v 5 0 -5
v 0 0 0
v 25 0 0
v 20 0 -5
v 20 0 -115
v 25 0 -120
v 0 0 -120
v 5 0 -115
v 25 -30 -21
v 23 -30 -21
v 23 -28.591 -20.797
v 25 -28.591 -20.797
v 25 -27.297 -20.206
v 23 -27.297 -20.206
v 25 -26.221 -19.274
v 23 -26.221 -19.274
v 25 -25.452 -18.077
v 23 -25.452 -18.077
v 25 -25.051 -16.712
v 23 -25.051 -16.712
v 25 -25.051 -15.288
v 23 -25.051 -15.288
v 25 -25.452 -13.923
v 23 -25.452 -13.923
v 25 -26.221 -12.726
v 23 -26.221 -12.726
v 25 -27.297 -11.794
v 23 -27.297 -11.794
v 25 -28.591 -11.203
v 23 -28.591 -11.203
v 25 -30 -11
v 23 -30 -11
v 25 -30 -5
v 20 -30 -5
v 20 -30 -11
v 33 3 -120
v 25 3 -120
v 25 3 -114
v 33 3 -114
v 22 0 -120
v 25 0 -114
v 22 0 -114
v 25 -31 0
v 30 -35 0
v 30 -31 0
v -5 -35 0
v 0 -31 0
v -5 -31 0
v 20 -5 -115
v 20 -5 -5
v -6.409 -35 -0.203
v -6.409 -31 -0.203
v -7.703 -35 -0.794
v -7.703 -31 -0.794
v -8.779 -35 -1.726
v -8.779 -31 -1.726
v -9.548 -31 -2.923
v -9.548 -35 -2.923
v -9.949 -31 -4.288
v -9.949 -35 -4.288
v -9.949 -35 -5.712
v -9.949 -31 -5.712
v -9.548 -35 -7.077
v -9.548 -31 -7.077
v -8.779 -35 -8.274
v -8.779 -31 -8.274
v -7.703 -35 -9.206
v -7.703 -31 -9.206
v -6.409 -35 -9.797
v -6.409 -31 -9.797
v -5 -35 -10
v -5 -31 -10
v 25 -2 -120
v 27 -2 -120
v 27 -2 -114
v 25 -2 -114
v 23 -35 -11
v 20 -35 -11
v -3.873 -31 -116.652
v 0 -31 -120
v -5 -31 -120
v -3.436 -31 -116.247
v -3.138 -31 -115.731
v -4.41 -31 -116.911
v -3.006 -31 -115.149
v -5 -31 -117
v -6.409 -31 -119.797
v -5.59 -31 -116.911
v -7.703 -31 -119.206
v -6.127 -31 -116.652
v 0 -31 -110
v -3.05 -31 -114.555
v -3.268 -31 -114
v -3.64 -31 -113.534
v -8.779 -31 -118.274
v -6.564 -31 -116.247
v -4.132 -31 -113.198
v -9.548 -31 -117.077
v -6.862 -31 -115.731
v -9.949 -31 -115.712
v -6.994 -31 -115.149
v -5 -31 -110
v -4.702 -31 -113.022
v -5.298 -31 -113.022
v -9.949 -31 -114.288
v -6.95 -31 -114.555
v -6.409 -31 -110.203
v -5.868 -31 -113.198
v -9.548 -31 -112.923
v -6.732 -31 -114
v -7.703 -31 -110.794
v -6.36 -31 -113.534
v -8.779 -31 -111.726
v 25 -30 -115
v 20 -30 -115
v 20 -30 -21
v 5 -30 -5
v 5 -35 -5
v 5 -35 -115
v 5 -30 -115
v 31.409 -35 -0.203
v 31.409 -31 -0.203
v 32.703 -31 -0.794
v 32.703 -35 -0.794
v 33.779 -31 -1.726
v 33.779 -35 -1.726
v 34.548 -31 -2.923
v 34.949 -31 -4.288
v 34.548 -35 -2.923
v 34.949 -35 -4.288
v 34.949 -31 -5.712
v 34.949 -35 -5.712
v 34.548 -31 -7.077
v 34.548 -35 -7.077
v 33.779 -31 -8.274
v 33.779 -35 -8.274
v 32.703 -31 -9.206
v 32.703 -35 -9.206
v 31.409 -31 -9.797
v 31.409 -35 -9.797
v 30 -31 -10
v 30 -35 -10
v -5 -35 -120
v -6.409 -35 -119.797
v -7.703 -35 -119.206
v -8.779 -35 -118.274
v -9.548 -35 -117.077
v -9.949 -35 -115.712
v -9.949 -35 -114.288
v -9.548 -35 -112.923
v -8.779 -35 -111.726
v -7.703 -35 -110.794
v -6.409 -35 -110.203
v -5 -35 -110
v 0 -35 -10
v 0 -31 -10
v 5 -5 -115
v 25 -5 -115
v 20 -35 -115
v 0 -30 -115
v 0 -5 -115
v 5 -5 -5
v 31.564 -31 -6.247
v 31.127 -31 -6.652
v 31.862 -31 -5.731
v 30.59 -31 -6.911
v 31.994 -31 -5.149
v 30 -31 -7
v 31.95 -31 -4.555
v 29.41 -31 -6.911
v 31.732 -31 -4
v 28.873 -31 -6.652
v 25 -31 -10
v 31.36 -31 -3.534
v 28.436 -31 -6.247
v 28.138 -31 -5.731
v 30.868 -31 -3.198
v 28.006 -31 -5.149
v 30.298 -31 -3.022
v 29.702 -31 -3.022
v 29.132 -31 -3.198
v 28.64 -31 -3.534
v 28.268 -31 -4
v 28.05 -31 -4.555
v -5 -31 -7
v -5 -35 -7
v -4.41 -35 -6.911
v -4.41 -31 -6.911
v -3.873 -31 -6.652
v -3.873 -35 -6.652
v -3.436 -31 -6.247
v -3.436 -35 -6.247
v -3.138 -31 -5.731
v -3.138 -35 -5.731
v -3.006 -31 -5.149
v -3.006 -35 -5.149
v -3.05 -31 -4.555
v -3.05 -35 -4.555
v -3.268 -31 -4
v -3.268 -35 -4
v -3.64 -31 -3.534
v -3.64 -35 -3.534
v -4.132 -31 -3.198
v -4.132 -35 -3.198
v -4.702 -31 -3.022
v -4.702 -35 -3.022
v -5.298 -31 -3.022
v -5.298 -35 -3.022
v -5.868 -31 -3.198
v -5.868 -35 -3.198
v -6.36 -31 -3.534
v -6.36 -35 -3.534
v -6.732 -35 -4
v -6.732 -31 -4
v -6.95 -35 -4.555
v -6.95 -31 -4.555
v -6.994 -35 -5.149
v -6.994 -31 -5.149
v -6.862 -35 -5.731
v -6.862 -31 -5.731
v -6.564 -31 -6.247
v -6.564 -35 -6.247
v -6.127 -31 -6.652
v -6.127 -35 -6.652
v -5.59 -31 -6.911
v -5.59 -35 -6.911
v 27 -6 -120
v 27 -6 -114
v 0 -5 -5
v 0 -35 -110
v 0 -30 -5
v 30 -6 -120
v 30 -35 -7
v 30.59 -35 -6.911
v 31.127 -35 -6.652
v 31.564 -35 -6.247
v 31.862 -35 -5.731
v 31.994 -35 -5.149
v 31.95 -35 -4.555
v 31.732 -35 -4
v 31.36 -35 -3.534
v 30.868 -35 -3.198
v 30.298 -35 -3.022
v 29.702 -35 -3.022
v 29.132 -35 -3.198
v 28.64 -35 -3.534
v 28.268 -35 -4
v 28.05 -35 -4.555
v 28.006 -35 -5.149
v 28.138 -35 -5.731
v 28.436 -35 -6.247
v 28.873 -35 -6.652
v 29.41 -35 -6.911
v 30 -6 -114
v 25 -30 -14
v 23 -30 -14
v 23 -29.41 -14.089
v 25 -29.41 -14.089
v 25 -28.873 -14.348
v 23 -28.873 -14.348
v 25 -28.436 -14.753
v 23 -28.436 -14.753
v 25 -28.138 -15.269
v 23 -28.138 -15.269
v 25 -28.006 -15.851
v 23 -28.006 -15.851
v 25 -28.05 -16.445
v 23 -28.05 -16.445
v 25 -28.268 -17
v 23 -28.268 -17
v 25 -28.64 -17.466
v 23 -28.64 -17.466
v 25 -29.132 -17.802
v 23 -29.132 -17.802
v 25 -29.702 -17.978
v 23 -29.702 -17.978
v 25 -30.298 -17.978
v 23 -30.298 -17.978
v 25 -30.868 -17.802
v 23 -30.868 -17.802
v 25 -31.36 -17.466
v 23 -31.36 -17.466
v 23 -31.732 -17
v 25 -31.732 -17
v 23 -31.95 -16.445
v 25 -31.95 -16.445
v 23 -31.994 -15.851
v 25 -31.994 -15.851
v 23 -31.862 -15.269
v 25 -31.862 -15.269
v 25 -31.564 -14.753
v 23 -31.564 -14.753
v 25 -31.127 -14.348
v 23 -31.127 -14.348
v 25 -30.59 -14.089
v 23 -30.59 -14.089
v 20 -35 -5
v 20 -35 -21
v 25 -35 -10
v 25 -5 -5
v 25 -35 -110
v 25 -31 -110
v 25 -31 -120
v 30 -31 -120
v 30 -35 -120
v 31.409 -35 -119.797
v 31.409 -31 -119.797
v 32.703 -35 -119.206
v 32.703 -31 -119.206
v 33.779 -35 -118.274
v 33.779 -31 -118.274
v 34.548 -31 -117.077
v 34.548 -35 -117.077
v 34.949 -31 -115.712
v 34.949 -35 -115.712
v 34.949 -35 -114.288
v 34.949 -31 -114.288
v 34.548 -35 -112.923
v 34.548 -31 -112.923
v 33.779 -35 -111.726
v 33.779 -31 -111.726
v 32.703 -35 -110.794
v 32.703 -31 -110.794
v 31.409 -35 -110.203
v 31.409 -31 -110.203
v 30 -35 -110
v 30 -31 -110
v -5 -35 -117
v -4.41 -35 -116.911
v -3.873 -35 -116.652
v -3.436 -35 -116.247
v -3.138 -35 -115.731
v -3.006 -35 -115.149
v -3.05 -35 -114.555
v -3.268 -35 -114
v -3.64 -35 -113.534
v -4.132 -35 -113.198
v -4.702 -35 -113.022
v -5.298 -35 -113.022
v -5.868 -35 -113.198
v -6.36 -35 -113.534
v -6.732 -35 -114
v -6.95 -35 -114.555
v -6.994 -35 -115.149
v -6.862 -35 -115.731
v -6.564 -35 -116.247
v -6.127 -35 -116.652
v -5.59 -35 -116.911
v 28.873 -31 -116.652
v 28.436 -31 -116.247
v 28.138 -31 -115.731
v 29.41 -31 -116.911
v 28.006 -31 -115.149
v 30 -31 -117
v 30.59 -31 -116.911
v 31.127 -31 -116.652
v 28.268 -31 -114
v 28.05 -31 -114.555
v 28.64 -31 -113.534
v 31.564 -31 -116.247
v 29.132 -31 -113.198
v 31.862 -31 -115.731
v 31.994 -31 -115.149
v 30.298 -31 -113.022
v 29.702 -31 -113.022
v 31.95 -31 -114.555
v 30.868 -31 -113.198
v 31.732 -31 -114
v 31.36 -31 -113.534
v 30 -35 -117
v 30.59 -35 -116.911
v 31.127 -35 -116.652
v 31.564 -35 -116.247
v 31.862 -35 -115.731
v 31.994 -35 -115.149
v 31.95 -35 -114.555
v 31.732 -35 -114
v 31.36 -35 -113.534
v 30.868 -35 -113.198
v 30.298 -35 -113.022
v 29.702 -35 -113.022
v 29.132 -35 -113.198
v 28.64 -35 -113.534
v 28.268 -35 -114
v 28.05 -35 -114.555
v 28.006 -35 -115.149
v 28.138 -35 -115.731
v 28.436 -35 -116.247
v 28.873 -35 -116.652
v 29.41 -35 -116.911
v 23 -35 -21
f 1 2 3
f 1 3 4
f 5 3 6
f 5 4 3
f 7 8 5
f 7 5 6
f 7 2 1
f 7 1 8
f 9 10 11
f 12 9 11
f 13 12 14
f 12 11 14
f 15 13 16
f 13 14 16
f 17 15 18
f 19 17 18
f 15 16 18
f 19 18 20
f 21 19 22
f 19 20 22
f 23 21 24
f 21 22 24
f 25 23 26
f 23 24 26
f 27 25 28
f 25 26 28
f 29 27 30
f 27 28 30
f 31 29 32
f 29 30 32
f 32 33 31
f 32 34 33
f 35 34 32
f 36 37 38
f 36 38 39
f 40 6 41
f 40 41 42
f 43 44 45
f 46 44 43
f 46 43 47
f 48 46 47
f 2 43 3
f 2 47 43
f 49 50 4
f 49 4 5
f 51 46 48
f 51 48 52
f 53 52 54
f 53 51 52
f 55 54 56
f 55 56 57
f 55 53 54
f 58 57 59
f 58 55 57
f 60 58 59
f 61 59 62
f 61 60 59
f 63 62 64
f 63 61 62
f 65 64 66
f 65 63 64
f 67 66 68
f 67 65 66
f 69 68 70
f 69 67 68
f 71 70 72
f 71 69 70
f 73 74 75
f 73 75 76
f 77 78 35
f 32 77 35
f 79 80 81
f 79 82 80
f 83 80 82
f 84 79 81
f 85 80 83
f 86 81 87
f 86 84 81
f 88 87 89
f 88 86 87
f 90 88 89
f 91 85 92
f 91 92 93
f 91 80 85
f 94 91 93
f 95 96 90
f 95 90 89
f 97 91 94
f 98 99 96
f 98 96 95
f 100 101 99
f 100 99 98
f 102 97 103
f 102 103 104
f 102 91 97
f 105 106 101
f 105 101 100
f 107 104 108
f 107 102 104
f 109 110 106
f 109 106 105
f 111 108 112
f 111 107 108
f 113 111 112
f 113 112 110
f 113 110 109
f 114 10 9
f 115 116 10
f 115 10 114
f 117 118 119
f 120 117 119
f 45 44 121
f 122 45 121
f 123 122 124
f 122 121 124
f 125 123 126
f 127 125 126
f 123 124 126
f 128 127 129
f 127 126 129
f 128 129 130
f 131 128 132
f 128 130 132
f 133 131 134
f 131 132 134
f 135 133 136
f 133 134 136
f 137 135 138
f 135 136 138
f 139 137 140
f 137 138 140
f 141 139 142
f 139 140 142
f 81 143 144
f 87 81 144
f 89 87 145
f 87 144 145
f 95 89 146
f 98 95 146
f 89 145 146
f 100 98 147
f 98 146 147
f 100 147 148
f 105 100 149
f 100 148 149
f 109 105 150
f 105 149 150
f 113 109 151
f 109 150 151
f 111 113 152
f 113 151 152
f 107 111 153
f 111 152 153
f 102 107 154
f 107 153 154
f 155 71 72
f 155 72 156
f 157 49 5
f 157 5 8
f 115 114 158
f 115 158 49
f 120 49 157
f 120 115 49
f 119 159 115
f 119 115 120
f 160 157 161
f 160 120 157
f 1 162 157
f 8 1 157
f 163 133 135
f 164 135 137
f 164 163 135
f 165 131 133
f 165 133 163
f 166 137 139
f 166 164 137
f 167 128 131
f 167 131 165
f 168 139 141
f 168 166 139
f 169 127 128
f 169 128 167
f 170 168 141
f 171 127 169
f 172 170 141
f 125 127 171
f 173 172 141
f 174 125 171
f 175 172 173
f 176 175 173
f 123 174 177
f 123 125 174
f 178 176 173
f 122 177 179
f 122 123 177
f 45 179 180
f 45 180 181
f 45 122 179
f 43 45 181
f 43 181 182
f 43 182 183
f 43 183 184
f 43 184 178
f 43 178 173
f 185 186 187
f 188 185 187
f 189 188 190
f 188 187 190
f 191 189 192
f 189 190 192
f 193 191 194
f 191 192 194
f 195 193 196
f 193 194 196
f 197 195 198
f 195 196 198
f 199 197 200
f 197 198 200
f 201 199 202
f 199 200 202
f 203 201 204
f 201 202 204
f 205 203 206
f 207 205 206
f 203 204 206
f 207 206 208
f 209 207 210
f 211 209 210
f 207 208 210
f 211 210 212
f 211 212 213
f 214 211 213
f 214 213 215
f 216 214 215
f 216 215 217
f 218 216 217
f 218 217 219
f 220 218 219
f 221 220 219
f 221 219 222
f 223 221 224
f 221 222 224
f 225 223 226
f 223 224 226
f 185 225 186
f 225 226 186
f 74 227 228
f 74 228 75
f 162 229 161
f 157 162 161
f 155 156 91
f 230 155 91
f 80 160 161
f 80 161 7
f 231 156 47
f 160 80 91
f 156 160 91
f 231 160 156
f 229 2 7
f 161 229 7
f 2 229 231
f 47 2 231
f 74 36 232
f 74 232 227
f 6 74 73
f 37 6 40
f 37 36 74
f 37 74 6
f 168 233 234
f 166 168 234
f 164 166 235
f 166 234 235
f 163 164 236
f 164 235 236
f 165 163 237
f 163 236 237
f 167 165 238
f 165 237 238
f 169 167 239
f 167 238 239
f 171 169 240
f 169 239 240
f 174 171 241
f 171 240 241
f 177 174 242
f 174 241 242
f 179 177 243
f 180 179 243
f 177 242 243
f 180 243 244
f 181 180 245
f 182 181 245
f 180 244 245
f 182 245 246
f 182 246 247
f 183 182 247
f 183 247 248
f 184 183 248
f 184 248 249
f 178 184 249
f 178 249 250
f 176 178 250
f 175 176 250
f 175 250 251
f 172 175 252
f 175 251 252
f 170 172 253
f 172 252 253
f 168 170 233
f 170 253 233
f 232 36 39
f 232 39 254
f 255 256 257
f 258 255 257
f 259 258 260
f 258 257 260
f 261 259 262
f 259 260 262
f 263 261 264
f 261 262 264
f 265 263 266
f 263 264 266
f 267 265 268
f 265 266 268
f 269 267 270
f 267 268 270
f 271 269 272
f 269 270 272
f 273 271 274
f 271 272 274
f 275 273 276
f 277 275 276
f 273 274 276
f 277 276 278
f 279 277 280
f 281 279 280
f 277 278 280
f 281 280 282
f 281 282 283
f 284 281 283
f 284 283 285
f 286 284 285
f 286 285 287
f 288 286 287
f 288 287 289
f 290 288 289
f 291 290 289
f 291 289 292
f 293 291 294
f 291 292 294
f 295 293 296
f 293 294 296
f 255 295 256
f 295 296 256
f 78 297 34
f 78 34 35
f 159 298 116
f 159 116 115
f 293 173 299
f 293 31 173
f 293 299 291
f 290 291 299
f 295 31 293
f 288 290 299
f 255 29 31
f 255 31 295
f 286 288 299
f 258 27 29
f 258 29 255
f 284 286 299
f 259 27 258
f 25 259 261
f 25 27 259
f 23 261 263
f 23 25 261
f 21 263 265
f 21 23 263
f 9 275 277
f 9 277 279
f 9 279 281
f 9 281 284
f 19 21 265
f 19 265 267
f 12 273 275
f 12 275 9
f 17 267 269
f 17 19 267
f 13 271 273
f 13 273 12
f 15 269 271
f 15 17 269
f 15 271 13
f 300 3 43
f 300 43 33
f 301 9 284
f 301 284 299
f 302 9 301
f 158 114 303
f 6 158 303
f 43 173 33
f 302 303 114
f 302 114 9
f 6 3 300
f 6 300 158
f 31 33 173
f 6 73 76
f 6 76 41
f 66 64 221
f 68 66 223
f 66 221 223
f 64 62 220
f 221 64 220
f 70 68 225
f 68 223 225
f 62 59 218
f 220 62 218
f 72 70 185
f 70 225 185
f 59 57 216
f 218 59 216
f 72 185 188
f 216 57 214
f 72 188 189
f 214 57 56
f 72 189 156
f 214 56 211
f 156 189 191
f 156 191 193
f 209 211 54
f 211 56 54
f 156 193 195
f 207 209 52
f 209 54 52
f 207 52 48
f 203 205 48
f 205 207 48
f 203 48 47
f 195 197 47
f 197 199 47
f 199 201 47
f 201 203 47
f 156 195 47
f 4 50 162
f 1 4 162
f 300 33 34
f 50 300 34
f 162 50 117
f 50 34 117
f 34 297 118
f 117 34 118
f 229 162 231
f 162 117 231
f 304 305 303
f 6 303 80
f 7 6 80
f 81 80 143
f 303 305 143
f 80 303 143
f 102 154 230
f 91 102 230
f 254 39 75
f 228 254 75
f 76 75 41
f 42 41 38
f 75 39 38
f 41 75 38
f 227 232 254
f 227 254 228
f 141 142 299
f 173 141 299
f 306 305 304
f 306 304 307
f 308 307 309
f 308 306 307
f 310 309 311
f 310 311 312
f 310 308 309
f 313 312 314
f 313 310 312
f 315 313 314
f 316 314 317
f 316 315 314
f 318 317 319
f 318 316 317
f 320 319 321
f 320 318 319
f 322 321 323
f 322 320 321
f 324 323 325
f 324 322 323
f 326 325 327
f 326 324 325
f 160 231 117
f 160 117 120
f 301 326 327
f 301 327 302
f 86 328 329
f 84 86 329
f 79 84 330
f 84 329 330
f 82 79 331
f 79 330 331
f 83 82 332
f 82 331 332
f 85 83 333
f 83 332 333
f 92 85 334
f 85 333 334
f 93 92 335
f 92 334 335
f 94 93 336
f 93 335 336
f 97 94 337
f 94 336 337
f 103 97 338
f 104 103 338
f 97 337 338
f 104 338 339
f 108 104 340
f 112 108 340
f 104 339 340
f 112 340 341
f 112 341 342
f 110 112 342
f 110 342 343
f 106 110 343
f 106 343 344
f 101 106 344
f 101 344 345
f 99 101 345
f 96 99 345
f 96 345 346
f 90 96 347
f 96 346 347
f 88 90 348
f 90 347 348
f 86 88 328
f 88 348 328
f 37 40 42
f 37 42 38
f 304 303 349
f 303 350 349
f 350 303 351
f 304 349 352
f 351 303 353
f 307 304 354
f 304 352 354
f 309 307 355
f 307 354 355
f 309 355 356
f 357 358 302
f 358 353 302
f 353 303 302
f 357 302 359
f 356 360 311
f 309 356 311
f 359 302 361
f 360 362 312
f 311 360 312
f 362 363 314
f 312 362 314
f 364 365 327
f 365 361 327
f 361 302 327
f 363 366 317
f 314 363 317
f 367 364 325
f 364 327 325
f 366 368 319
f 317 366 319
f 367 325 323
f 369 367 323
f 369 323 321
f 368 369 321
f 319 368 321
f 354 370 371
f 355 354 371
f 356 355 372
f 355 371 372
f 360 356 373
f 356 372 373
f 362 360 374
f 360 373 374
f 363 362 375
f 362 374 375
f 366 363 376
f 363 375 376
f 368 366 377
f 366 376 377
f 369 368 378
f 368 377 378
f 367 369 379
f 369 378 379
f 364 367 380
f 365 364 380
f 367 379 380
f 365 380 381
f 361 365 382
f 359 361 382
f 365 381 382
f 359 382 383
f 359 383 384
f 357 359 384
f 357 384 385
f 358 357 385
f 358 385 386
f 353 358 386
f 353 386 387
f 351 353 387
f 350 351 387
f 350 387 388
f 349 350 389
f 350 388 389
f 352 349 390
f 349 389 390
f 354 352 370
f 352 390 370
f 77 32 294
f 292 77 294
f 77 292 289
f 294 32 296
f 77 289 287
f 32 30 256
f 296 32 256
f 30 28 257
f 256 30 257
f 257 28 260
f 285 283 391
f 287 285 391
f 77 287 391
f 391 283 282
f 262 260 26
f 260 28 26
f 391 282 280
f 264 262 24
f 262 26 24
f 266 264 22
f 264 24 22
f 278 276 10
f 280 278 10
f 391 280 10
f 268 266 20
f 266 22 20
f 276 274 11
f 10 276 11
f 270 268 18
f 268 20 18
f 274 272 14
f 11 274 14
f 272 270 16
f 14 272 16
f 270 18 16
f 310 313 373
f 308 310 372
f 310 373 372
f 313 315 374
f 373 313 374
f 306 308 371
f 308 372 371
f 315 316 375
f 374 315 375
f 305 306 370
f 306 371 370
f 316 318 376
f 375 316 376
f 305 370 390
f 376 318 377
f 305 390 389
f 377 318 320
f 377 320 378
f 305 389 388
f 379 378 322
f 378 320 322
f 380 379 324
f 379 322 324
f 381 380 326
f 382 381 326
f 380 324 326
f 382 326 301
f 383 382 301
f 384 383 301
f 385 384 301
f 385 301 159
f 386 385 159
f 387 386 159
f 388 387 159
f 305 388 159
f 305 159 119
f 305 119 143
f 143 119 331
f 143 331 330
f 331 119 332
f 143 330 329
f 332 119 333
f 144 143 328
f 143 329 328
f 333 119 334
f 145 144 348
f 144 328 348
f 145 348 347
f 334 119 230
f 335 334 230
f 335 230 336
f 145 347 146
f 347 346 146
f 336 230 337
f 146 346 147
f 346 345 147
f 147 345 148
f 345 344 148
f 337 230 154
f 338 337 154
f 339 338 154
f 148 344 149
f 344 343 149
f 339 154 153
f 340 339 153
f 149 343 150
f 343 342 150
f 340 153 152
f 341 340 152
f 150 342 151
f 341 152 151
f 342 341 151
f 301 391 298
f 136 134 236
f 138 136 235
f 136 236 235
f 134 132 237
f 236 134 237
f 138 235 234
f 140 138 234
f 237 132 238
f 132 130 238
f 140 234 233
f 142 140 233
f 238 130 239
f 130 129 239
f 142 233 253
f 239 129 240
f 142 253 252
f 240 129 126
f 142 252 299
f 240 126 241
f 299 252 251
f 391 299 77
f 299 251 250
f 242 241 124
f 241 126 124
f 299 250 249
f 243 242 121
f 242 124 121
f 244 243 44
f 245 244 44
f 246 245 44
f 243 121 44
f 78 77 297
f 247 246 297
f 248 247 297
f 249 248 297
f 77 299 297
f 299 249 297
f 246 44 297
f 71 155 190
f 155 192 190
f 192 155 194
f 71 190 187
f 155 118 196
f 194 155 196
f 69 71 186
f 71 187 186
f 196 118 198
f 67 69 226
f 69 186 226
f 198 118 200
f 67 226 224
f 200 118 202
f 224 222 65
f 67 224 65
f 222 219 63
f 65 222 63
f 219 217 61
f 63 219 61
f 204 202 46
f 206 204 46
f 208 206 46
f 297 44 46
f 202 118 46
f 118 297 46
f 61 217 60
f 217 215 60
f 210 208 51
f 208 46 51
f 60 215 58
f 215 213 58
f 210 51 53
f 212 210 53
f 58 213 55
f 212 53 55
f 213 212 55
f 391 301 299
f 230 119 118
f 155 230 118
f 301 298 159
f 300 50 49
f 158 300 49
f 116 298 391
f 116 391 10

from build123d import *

# Parameters (mm, degrees)
SKETCH1_W           = 120
SKETCH1_H           = 35
SKETCH1_W_2         = 110
SKETCH1_H_2         = 25
BOSS_EXTRUDE1_DEPTH = 25
CUT_EXTRUDE1_REACH  = 129.475
SKETCH2_W           = 15
SKETCH2_H           = 110
SKETCH3_R           = 2
BOSS_EXTRUDE2_DEPTH = 4
SKETCH4_W           = 10
SKETCH4_H           = 5
CUT_EXTRUDE2_DEPTH  = 3
BOSS_EXTRUDE3_DEPTH = 2
SKETCH6_R           = 2
CUT_EXTRUDE3_DEPTH  = 2
BOSS_EXTRUDE4_DEPTH = 6


with BuildPart() as part:
    # Sketch1 → Boss-Extrude1 (new body)
    with BuildSketch(Plane(origin=(0, 0, 0), x_dir=(0, 0, -1), z_dir=(1, 0, 0))):
        with Locations((60, -17.5)):
            Rectangle(SKETCH1_W, SKETCH1_H)
        with Locations((60, -17.5)):
            Rectangle(SKETCH1_W_2, SKETCH1_H_2, mode=Mode.SUBTRACT)
    extrude(amount=BOSS_EXTRUDE1_DEPTH)

    # Cut-Extrude1: up to this face of the body (flat: up to its plane)
    cut_extrude1_end = Plane(part.part.faces().sort_by_distance((12.5, 0, -60))[0])
    # Sketch2 → Cut-Extrude1 (cut, up to the picked face)
    with BuildSketch(Plane(origin=(0, -35, 0), x_dir=(-1, 0, 0), z_dir=(0, -1, 0)), mode=Mode.PRIVATE) as cut_extrude1_sk1:
        with Locations((-12.5, 60)):
            Rectangle(SKETCH2_W, SKETCH2_H)
    cut_extrude1_tool1 = split(extrude(cut_extrude1_sk1.sketch, amount=-CUT_EXTRUDE1_REACH, mode=Mode.PRIVATE), bisect_by=cut_extrude1_end, keep=Keep.BOTH, mode=Mode.PRIVATE)
    add(cut_extrude1_tool1.solids().sort_by(Axis((12.5, -35, -60), (0, 1, 0)))[0], mode=Mode.SUBTRACT)

    # Sketch3 → Boss-Extrude2 (add)
    # profile 1 of 4: a face of its own
    with BuildSketch(Plane.XZ.offset(35)):
        with BuildLine():
            Line((0, -120), (-5, -120))
            ThreePointArc((-5, -120), (-10, -115), (-5, -110))
            Line((-5, -110), (0, -110))
            Line((0, -110), (0, -120))
        make_face()
        with Locations(Location((-5, -115, 0), (0, 0, 270))):
            Circle(SKETCH3_R, mode=Mode.SUBTRACT)
    # profile 2 of 4: a face of its own
    with BuildSketch(Plane.XZ.offset(35)):
        with BuildLine():
            Line((0, 0), (-5, 0))
            ThreePointArc((-5, 0), (-10, -5), (-5, -10))
            Line((-5, -10), (0, -10))
            Line((0, -10), (0, 0))
        make_face()
        with Locations(Location((-5, -5, 0), (0, 0, 270))):
            Circle(SKETCH3_R, mode=Mode.SUBTRACT)
    # profile 3 of 4: a face of its own
    with BuildSketch(Plane.XZ.offset(35)):
        with BuildLine():
            Line((25, -120), (30, -120))
            ThreePointArc((30, -120), (35, -115), (30, -110))
            Line((30, -110), (25, -110))
            Line((25, -110), (25, -120))
        make_face()
        with Locations(Location((30, -115, 0), (0, 0, 270))):
            Circle(SKETCH3_R, mode=Mode.SUBTRACT)
    # profile 4 of 4: a face of its own
    with BuildSketch(Plane.XZ.offset(35)):
        with BuildLine():
            Line((25, 0), (30, 0))
            ThreePointArc((30, 0), (35, -5), (30, -10))
            Line((30, -10), (25, -10))
            Line((25, -10), (25, 0))
        make_face()
        with Locations(Location((30, -5, 0), (0, 0, 270))):
            Circle(SKETCH3_R, mode=Mode.SUBTRACT)
    extrude(amount=-BOSS_EXTRUDE2_DEPTH)

    # Sketch4 → Cut-Extrude2 (cut)
    with BuildSketch(Plane.ZY.offset(-20)):
        with Locations((-16, -32.5)):
            Rectangle(SKETCH4_W, SKETCH4_H)
    extrude(amount=-CUT_EXTRUDE2_DEPTH, mode=Mode.SUBTRACT)

    # Sketch5 → Boss-Extrude3 (add)
    with BuildSketch(Plane.ZY.offset(-23)):
        with BuildLine():
            Line((-11, -30), (-21, -30))
            ThreePointArc((-21, -30), (-16, -25), (-11, -30))
        make_face()
    extrude(amount=-BOSS_EXTRUDE3_DEPTH)

    # Sketch6 → Cut-Extrude3 (cut)
    with BuildSketch(Plane.ZY.offset(-23)):
        with Locations((-16, -30)):
            Circle(SKETCH6_R)
    extrude(amount=-CUT_EXTRUDE3_DEPTH, mode=Mode.SUBTRACT)


with BuildPart() as body_2:
    # Sketch7 → Boss-Extrude4 (new body)
    with BuildSketch(Plane(origin=(0, 0, -120), x_dir=(-1, 0, 0), z_dir=(0, 0, -1))):
        Polygon((-27, -2), (-25, -2), (-25, 0), (-25, 3), (-33, 3), (-30, -6), (-27, -6), align=None)
        Polygon((-25, 3), (-25, 0), (-22, 0), align=None)
    extrude(amount=-BOSS_EXTRUDE4_DEPTH)


solid = Compound([part.part, body_2.part])
